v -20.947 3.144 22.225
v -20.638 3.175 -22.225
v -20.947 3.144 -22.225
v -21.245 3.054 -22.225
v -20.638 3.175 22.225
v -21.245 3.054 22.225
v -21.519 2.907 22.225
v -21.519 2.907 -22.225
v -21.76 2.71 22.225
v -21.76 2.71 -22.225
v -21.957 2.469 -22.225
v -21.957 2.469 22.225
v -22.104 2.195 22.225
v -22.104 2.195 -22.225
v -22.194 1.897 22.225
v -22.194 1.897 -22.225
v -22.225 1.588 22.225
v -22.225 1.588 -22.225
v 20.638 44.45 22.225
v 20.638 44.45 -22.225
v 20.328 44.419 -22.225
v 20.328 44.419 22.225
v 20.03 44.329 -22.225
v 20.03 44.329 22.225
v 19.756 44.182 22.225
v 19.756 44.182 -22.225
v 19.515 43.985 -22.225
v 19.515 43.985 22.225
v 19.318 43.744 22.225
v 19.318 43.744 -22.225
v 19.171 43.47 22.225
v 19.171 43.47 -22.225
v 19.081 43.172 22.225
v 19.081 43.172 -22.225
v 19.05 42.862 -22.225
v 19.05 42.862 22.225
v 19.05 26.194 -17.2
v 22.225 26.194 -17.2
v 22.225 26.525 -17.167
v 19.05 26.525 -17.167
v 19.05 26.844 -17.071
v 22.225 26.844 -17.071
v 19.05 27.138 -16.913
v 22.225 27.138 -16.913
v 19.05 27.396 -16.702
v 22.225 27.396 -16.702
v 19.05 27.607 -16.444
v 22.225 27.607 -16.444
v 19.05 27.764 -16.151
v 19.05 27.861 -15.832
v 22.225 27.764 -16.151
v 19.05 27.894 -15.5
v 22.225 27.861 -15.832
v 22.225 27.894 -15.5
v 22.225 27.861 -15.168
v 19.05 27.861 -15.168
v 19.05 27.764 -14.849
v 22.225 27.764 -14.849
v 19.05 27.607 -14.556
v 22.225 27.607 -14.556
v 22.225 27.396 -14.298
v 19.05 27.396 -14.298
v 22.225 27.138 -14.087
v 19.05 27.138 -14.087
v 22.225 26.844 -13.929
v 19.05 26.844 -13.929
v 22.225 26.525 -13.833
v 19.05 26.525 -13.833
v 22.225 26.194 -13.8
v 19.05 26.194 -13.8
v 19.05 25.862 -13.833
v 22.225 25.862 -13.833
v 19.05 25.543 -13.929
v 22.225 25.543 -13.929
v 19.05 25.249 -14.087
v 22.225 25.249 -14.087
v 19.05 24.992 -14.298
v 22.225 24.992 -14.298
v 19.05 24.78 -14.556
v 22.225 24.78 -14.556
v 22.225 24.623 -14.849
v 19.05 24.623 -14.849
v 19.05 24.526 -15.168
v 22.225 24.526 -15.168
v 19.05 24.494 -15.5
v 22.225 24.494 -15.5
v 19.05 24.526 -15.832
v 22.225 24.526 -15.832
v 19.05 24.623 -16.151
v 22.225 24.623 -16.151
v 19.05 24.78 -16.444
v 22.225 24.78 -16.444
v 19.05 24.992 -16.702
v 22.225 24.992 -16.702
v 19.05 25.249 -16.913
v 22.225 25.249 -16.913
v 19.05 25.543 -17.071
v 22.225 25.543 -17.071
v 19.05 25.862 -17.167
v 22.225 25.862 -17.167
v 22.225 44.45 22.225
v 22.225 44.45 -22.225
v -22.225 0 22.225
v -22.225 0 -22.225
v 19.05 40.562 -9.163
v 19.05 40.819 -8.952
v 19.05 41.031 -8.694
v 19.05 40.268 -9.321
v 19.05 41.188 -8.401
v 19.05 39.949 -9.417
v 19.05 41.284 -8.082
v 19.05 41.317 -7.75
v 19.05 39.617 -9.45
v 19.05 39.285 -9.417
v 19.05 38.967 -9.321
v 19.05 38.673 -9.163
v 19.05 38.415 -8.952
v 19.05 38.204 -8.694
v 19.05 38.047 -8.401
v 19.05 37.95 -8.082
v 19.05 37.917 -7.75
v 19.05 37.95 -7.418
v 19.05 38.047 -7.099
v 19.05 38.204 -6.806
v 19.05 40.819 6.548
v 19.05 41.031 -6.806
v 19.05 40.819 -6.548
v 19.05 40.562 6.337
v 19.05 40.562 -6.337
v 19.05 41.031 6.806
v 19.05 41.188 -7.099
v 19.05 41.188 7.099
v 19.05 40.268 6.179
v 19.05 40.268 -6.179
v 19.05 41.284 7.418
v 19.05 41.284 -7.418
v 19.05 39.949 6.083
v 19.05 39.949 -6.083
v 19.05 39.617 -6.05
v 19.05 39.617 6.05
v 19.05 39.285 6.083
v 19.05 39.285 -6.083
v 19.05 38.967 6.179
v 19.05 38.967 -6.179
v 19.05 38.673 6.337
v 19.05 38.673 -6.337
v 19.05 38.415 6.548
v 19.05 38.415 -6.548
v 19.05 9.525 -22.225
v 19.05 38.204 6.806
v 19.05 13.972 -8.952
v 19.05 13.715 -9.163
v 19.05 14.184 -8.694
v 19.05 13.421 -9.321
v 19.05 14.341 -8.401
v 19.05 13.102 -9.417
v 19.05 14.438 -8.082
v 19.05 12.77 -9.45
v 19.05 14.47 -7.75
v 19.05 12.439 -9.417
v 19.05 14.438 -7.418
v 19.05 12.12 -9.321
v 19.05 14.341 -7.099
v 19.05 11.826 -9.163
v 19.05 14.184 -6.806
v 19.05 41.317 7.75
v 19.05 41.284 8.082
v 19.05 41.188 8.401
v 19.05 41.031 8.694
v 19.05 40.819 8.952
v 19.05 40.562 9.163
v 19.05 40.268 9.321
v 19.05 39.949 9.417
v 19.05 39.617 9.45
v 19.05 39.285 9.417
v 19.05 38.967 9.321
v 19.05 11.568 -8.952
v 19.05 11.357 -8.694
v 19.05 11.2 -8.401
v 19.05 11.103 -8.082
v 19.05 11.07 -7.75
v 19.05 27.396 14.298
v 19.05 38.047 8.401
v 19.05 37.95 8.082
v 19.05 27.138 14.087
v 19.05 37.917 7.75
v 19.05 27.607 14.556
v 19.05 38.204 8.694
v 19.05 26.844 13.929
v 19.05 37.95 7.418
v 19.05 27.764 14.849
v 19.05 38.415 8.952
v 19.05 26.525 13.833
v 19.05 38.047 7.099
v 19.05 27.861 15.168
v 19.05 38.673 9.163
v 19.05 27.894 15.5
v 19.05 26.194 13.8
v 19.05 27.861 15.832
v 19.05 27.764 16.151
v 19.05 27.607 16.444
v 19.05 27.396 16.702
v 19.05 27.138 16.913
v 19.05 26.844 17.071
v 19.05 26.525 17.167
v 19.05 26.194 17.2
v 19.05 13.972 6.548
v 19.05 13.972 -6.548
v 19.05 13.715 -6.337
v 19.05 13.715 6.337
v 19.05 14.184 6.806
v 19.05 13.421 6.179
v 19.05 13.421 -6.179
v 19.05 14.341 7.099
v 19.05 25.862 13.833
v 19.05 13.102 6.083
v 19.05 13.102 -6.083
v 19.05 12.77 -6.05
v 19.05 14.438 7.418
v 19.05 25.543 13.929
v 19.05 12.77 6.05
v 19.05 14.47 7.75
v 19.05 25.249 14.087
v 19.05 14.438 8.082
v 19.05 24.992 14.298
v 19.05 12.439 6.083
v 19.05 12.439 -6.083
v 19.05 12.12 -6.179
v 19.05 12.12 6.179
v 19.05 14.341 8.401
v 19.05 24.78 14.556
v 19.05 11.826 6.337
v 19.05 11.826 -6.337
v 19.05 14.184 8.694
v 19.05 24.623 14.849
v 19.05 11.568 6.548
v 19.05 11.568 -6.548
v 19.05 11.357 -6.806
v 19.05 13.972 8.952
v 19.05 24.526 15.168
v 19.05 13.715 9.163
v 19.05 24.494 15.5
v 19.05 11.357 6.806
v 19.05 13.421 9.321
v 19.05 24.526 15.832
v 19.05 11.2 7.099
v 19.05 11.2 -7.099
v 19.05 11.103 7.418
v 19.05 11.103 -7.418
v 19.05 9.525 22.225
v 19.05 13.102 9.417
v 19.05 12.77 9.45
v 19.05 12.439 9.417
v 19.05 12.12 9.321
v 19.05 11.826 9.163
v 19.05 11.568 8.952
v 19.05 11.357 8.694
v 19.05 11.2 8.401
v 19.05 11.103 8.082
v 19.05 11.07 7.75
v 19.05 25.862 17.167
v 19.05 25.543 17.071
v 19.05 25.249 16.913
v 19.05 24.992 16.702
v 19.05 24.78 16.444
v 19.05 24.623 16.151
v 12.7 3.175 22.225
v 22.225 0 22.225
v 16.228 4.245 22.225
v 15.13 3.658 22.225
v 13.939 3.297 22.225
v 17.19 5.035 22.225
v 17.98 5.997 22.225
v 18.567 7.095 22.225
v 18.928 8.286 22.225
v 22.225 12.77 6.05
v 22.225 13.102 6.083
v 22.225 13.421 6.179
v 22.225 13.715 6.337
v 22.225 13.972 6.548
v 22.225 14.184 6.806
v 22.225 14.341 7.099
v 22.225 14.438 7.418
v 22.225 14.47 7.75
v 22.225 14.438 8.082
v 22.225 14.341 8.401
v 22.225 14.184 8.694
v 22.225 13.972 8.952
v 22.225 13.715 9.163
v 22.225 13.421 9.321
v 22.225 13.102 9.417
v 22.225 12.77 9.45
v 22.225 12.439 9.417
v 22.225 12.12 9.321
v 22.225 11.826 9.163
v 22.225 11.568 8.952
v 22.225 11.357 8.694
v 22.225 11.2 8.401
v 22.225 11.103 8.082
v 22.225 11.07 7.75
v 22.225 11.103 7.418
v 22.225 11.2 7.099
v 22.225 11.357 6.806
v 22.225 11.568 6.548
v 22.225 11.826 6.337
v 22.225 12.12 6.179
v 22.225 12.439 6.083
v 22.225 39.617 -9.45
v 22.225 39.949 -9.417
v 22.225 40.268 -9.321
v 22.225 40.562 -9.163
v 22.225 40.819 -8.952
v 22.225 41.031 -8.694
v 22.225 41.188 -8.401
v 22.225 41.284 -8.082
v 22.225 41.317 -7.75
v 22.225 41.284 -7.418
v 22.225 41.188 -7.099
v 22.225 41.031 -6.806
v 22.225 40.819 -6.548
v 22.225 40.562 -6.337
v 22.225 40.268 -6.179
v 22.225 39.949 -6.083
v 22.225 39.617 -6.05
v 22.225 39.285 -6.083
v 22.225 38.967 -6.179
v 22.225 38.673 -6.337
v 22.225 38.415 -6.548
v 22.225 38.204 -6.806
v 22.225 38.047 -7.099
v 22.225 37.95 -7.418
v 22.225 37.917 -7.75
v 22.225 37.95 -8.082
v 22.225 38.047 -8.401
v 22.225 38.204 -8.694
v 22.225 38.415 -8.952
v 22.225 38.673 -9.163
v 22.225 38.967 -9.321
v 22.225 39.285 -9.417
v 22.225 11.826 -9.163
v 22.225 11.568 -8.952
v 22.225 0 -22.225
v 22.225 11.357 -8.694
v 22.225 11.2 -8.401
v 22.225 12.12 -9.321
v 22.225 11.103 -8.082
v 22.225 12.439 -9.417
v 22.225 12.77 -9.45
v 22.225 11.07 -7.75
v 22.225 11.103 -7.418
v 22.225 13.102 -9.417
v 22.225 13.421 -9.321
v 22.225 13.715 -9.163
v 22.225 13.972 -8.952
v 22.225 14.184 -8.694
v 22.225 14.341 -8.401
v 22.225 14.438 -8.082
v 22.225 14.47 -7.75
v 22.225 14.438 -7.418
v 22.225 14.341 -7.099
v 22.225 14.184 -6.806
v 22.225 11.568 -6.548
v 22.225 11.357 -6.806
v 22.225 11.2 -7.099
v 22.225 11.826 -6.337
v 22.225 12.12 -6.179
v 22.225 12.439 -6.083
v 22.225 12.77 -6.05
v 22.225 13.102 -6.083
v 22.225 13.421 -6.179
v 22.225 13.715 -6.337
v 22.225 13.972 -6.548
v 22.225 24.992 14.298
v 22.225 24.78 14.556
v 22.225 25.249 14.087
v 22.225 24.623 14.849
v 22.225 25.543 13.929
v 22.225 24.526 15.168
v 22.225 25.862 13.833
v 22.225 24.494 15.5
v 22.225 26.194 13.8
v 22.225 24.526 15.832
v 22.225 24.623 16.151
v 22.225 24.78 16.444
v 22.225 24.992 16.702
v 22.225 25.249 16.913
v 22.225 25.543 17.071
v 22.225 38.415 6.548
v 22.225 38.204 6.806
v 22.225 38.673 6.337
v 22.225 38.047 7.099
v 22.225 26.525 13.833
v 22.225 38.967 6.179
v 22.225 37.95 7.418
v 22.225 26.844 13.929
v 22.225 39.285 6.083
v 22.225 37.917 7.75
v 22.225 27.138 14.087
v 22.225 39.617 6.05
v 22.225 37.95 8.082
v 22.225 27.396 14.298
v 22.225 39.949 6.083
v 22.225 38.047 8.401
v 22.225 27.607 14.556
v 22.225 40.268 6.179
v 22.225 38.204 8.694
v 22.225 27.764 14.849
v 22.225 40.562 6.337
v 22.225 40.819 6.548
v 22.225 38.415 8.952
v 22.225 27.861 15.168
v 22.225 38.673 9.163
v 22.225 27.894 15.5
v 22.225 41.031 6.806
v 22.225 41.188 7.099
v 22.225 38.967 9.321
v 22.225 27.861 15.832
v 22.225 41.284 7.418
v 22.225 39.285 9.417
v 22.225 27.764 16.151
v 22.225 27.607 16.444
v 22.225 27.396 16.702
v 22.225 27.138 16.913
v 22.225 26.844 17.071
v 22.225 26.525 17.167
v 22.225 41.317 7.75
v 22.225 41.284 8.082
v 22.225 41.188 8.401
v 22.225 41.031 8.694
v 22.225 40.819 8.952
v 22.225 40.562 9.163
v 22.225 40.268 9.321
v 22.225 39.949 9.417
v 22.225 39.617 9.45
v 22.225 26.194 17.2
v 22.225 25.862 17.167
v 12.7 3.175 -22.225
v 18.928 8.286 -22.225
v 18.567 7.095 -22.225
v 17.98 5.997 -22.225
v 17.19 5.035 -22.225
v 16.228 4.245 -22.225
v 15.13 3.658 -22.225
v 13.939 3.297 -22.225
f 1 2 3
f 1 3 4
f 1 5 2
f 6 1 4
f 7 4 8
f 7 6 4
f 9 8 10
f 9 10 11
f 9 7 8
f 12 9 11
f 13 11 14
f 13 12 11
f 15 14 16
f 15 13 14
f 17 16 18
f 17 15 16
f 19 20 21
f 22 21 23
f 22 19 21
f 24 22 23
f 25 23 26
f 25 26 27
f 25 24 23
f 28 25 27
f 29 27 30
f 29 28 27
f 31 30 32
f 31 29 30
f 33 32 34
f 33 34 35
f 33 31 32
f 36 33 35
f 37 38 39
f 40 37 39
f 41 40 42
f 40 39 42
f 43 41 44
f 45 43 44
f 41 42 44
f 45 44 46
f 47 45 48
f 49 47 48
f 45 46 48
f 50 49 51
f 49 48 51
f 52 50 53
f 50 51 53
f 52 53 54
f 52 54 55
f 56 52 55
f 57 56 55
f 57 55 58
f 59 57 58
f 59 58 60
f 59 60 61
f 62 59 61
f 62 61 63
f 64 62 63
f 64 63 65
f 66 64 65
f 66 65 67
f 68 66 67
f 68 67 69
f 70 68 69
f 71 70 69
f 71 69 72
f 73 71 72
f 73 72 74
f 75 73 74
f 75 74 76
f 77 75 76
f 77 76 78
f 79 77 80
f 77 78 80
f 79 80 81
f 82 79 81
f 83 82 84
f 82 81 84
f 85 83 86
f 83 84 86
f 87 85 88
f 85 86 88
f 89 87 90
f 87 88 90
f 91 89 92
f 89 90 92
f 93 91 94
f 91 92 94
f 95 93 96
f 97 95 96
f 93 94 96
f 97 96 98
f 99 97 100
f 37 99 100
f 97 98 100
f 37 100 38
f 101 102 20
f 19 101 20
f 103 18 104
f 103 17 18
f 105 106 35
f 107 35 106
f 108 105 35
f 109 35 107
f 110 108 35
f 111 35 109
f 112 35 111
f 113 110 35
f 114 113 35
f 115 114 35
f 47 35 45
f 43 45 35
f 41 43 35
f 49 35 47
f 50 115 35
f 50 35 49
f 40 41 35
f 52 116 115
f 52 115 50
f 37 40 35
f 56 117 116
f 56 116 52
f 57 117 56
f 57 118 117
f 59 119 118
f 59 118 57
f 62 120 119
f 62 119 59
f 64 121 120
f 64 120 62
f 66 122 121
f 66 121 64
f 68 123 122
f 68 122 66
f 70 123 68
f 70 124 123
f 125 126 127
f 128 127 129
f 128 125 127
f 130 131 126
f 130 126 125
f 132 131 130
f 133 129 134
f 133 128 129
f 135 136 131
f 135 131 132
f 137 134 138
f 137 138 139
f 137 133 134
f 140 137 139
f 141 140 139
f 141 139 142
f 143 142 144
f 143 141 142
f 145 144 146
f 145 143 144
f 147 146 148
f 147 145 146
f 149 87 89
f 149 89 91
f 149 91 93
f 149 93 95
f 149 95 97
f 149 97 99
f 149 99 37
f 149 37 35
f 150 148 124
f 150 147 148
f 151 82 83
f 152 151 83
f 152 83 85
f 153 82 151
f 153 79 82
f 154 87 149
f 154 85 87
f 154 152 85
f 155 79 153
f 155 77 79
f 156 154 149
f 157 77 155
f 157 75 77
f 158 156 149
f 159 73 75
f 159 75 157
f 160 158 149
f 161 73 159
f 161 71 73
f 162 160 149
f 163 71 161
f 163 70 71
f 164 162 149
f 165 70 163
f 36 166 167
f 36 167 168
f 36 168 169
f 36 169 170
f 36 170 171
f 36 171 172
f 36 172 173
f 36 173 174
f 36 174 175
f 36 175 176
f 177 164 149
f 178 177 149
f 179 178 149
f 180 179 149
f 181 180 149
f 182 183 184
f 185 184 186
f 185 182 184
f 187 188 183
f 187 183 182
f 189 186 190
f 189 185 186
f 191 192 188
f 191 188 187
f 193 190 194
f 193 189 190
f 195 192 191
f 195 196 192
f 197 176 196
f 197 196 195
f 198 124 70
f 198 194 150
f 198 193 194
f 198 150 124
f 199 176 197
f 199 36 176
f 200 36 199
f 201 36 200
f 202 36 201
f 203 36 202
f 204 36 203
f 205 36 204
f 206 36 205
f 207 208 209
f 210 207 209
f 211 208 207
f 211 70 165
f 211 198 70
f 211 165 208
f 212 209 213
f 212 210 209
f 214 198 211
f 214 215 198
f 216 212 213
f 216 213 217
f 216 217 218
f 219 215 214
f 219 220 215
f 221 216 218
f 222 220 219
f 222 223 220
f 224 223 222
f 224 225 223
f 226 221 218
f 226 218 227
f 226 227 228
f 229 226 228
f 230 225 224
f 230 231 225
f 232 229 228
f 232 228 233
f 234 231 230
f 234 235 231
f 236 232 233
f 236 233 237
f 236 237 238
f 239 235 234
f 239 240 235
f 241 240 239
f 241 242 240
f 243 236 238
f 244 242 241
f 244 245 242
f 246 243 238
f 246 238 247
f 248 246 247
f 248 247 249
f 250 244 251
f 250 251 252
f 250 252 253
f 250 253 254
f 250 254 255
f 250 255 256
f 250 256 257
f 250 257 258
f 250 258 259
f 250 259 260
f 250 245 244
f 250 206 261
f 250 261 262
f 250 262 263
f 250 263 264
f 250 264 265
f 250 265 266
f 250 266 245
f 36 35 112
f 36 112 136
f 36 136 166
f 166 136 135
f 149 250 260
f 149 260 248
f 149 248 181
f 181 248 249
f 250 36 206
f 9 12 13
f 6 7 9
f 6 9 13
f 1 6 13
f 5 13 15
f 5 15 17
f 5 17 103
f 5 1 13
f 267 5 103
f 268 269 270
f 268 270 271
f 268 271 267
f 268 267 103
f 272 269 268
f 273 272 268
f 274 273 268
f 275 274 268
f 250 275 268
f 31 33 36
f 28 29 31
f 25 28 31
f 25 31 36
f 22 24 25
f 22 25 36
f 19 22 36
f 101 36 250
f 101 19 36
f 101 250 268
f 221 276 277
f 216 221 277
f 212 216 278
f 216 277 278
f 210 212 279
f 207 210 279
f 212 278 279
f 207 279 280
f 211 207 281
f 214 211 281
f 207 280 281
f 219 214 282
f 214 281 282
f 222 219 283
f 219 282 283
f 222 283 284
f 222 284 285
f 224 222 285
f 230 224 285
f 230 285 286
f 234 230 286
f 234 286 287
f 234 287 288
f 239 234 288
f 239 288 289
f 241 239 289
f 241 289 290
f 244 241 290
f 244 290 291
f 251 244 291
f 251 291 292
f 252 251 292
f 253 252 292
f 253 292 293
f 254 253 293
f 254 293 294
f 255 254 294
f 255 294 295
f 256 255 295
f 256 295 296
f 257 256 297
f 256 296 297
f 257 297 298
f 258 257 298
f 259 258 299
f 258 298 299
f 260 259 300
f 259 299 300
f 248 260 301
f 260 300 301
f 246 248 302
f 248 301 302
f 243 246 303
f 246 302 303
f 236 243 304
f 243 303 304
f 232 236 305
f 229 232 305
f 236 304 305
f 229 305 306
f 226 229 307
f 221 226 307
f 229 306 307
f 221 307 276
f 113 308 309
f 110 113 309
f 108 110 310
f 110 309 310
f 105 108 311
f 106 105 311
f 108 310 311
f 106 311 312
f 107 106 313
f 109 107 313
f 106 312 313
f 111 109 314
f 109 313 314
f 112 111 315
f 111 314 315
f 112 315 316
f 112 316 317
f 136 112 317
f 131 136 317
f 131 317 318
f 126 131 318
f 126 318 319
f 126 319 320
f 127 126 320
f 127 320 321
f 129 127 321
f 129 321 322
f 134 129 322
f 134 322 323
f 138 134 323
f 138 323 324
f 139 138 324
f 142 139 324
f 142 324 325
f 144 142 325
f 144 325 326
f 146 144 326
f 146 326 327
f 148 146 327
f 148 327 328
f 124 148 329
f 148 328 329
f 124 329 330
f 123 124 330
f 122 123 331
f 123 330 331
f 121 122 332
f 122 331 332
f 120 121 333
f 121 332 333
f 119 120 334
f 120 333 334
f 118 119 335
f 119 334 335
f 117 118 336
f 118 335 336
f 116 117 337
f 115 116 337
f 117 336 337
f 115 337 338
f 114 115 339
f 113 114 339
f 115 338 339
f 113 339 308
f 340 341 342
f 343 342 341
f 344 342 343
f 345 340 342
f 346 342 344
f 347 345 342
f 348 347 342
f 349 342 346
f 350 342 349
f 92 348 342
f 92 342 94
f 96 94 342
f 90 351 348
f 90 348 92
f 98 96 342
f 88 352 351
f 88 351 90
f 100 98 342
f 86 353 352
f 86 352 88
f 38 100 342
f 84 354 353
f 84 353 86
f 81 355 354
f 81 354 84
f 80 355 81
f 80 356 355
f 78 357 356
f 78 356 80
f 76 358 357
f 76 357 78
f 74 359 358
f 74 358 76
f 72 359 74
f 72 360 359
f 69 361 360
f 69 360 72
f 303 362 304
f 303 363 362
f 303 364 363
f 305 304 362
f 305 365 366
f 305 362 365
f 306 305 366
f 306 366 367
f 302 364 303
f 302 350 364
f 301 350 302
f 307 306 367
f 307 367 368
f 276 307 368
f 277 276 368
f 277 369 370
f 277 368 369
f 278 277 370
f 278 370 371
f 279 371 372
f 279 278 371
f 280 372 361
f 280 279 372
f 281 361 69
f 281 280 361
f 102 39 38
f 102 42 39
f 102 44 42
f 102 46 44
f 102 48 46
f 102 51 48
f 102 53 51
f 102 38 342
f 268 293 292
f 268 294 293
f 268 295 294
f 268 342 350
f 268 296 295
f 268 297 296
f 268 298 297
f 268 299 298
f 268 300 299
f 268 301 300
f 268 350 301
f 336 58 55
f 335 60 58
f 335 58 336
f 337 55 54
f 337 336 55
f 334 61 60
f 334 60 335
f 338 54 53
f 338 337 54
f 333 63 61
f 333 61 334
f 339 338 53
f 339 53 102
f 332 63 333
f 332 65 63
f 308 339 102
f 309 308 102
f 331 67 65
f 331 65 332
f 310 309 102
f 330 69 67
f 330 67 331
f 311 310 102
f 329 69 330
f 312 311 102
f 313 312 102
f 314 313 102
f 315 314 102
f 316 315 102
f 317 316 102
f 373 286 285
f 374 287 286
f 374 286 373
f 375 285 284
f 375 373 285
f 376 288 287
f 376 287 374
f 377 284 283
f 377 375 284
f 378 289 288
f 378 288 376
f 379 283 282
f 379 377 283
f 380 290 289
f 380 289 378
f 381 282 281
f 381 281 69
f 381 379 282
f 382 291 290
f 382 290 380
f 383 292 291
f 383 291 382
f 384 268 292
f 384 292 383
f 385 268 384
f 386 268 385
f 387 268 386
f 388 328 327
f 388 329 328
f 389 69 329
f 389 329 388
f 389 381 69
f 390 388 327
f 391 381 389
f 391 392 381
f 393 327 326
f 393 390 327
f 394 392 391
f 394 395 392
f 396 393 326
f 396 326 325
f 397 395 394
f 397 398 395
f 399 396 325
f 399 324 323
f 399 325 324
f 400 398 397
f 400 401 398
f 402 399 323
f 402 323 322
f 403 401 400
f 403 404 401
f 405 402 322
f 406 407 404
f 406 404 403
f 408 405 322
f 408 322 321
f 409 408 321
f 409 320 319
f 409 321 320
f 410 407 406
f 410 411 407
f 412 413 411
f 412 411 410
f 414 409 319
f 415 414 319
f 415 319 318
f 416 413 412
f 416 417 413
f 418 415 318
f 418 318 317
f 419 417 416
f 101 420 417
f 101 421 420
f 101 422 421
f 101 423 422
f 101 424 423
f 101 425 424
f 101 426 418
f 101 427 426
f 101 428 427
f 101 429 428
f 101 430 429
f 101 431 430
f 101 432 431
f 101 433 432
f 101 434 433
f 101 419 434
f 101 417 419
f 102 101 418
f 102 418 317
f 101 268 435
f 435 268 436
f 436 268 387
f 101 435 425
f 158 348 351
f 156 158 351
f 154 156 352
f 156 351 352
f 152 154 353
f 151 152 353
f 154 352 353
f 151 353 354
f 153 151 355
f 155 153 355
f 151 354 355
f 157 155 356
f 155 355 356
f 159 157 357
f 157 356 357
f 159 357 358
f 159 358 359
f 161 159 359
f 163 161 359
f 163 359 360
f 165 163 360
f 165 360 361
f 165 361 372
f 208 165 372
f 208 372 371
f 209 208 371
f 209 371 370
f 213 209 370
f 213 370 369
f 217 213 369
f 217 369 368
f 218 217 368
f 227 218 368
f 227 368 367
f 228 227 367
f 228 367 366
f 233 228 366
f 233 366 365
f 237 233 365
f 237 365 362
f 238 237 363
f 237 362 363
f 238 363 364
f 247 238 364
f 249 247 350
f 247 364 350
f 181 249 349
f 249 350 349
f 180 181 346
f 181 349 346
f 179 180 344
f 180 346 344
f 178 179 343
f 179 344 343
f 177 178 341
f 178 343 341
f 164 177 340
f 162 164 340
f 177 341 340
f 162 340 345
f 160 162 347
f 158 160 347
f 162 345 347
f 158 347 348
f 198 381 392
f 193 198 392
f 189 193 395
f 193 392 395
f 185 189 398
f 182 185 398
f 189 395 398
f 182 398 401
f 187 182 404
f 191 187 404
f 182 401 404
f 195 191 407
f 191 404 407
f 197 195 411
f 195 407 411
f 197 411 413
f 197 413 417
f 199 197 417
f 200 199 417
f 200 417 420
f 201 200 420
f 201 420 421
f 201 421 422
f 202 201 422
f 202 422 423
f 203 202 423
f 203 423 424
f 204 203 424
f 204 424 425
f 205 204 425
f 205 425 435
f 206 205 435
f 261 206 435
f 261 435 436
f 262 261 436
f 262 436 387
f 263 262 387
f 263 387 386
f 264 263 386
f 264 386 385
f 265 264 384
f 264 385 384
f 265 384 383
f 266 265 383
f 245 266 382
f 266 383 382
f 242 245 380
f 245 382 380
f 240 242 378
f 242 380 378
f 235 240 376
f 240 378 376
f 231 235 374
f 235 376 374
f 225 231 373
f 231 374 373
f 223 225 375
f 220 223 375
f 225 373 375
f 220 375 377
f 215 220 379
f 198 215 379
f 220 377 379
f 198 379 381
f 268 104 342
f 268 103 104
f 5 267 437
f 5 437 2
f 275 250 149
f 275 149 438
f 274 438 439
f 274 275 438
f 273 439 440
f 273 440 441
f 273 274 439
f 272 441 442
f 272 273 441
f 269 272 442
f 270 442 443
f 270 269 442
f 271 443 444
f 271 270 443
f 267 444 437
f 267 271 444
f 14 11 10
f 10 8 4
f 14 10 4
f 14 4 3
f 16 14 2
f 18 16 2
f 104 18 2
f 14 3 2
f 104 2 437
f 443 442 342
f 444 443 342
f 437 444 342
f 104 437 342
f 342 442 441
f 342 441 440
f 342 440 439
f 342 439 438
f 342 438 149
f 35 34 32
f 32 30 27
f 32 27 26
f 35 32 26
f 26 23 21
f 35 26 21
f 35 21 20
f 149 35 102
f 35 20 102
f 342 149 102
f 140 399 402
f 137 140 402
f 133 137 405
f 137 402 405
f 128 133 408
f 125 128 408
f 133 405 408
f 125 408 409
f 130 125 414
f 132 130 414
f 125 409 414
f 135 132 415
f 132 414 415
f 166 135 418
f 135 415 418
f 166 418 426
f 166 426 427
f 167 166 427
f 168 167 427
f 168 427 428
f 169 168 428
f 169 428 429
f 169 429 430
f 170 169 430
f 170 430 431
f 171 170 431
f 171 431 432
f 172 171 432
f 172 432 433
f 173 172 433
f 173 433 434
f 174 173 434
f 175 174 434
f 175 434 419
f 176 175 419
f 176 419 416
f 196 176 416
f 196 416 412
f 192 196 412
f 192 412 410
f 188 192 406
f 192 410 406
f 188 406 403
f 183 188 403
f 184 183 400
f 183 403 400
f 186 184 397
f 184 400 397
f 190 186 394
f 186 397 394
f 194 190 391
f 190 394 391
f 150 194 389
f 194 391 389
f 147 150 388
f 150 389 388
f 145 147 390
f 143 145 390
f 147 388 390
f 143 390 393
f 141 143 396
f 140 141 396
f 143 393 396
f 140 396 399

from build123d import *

# Parameters (mm, degrees)
BOSS_EXTRUDE1_DEPTH  = 22.225
M3_CLEARANCE_HOLE2_D = 3.4


with BuildPart() as part:
    # Sketch2 → Boss-Extrude1 (new, symmetric)
    with BuildSketch(Plane.XY):
        with BuildLine():
            Line((-22.225, 0), (22.225, 0))
            Line((22.225, 0), (22.225, 44.45))
            Line((22.225, 44.45), (20.6375, 44.45))
            ThreePointArc((20.6375, 44.45), (19.514967985, 43.985032015), (19.05, 42.8625))
            Line((19.05, 42.8625), (19.05, 9.525))
            ThreePointArc((19.05, 9.525), (17.190128061, 5.034871939), (12.7, 3.175))
            Line((12.7, 3.175), (-20.6375, 3.175))
            ThreePointArc((-20.6375, 3.175), (-21.760032015, 2.710032015), (-22.225, 1.5875))
            Line((-22.225, 1.5875), (-22.225, 0))
        make_face()
    extrude(amount=BOSS_EXTRUDE1_DEPTH, both=True)

    # M3 Clearance Hole2 (through all)
    with Locations(Plane.ZY.offset(-19.05)):
        with Locations((7.75, 12.770356241), (15.5, 26.19375), (7.75, 39.617143759), (-7.75, 39.617143759), (-15.5, 26.19375), (-7.75, 12.770356241)):
            Hole(M3_CLEARANCE_HOLE2_D / 2)


solid = part.part
